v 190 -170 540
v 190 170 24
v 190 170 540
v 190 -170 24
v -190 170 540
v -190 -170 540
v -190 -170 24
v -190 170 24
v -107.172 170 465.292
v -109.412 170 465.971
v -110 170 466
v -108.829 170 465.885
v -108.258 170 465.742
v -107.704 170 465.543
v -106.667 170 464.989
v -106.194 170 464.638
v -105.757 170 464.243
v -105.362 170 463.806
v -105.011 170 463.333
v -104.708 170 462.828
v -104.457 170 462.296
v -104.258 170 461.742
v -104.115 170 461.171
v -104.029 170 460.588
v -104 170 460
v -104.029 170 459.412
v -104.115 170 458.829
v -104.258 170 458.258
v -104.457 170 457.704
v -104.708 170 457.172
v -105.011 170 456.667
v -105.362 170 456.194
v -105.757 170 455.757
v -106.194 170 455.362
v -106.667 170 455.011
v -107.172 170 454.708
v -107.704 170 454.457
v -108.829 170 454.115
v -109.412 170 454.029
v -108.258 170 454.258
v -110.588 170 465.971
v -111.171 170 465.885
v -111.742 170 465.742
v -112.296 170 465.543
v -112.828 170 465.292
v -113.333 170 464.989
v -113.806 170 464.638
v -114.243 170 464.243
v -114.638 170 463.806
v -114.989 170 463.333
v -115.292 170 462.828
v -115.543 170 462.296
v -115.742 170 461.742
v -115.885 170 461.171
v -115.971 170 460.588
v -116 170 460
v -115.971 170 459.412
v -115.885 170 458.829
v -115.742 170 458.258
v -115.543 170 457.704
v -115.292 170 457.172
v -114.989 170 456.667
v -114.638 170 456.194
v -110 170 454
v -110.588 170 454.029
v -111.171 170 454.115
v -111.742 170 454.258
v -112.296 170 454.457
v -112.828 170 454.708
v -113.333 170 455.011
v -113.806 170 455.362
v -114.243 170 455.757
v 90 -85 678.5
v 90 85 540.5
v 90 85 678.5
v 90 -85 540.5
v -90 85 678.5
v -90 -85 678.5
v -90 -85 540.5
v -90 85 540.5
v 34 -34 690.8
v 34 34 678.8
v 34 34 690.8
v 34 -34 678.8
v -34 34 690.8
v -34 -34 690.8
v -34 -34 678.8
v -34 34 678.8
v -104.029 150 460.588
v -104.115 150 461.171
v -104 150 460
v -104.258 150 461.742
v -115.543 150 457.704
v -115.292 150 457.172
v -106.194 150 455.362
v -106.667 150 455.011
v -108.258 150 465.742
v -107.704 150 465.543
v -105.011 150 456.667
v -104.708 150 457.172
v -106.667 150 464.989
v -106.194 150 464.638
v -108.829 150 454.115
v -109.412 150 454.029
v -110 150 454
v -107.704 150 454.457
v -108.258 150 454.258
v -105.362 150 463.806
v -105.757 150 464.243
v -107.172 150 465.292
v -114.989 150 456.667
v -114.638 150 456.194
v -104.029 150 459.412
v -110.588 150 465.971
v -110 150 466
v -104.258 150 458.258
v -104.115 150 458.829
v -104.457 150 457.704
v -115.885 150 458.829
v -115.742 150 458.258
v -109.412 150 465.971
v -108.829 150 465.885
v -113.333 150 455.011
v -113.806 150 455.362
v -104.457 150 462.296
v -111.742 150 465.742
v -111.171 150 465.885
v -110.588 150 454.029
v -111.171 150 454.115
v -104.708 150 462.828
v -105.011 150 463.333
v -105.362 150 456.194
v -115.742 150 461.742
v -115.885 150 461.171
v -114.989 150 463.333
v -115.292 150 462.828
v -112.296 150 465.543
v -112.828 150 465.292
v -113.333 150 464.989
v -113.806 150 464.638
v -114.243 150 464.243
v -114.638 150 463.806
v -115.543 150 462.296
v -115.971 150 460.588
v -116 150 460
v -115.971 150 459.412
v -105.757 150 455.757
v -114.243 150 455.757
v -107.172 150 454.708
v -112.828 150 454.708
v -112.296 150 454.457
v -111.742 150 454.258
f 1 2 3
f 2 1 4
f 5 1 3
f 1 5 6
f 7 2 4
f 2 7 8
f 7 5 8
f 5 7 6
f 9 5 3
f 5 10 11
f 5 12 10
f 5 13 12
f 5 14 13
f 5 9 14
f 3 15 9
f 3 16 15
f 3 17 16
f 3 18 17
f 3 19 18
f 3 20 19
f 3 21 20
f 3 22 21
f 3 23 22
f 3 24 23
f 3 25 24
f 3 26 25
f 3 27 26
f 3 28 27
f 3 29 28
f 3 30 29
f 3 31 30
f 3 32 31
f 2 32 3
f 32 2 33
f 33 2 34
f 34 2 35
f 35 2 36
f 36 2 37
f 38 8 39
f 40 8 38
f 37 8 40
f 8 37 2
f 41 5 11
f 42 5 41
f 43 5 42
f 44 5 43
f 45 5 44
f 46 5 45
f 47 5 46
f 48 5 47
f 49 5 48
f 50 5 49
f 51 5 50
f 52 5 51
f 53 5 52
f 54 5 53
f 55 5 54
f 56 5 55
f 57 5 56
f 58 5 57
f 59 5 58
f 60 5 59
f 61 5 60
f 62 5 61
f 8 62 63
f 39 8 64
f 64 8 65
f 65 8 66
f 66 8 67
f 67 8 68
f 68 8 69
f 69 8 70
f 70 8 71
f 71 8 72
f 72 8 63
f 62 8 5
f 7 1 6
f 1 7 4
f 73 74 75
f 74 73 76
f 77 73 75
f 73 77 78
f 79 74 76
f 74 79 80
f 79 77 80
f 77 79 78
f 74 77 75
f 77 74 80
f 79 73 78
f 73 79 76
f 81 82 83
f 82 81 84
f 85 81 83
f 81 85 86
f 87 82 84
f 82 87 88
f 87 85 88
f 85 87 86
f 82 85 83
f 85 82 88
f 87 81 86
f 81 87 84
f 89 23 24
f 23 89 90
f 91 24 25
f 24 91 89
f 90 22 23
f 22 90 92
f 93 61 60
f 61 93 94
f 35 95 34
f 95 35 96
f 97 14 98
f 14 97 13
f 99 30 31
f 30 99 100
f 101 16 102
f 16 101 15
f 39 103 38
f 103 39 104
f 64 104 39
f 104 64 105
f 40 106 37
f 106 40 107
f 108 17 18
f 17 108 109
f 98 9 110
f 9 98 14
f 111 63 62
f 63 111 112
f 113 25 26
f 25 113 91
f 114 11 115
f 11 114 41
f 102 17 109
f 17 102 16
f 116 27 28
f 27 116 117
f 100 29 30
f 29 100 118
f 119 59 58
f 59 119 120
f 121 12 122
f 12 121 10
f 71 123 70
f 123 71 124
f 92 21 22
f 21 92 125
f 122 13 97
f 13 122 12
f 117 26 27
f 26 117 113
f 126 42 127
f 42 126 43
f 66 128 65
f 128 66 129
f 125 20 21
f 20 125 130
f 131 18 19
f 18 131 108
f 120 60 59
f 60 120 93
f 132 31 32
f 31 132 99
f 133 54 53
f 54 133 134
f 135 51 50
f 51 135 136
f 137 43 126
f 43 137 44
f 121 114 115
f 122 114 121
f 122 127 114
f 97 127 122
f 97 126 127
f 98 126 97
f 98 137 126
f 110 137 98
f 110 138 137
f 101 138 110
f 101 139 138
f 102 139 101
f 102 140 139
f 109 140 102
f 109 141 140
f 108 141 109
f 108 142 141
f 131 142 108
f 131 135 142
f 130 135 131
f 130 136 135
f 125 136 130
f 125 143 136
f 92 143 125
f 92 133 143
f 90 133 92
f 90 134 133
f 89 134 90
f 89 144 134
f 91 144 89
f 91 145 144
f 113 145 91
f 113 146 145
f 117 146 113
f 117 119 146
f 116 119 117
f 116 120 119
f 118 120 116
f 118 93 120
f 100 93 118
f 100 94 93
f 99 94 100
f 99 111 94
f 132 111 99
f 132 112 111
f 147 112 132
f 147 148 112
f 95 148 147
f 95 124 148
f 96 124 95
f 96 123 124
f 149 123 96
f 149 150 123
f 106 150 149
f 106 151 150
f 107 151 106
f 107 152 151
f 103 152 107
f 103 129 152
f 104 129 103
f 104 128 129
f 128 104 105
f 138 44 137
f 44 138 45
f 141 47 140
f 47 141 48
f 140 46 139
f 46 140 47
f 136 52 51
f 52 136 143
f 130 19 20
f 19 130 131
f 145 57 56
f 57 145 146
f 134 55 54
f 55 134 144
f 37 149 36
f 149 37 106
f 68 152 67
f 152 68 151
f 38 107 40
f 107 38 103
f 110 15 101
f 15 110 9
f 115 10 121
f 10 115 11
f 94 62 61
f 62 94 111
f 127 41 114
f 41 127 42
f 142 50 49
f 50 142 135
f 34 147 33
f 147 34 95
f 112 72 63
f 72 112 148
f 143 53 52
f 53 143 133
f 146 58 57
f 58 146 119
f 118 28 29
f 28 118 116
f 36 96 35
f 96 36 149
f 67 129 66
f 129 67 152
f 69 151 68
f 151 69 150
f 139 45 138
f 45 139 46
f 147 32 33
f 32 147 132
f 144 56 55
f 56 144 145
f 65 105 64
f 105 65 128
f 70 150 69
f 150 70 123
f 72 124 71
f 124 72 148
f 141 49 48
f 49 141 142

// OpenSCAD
// ============================================================================
// Atom Lithography Machine — Parametric OpenSCAD Module (S5.4-03)
// ============================================================================
// part_id           : S5.4-03
// parent_bom_id     : S5.4
// subsystem         : S5
// part_name         : UHV/N2 purjlu yonga tasima podlari ve depolama kabini
// material          : 304 SS
// temp_stage        : 300 K
// vacuum_grade      : N2 atmosferi
// tolerance         : <1 ppm O2/H2O
// computed_mass_kg  : 41.97232
// envelope_mm       : 380.000 x 383.000 x 690.800
// design_maturity   : M0_M1_DETAILED_CAD_DESIGN_ONLY
// no_lab_measurement: true
// iec61508_certified: false
// semi_s2_certified : false
// Units: millimeters (mm)
// ============================================================================

$fn = 64;

// Nominal bounding envelope parameters (mm)
bbox_x = 380.0000;
bbox_y = 383.0000;
bbox_z = 690.8000;

// Part-specific parametric dimensions
cab_w = 380.0;
cab_d = 340.0;
cab_h = 516.0;
foup_w = 180.0;

// Interface / port parameters (mm)

module part_S5_4_03() {
  difference() {
    union() {
      // 304 SS dry-N2 wafer storage cabinet
      translate([0.000, 0.000, 282.000]) cube([380.000, 340.000, 516.000], center=true);
      // PFA N2-purged FOUP transfer pod
      translate([0.000, 0.000, 609.500]) cube([180.000, 170.000, 138.000], center=true);
      // SEMI E47.1 top robotic grip flange
      translate([0.000, 0.000, 684.800]) cube([68.000, 68.000, 12.000], center=true);
    }
    // N2 purge gas inlet
    translate([-110.000, 170.000, 460.000]) rotate([90.000, 0.000, 0.000]) cylinder(d=12.000, h=40.000, center=true);
  }
}

// World assembly mounting transform (global machine frame, mm / deg):
// translate([780.000, -900.000, 0.000]) rotate([0.000, 0.000, 0.000]) part_S5_4_03();

part_S5_4_03();
